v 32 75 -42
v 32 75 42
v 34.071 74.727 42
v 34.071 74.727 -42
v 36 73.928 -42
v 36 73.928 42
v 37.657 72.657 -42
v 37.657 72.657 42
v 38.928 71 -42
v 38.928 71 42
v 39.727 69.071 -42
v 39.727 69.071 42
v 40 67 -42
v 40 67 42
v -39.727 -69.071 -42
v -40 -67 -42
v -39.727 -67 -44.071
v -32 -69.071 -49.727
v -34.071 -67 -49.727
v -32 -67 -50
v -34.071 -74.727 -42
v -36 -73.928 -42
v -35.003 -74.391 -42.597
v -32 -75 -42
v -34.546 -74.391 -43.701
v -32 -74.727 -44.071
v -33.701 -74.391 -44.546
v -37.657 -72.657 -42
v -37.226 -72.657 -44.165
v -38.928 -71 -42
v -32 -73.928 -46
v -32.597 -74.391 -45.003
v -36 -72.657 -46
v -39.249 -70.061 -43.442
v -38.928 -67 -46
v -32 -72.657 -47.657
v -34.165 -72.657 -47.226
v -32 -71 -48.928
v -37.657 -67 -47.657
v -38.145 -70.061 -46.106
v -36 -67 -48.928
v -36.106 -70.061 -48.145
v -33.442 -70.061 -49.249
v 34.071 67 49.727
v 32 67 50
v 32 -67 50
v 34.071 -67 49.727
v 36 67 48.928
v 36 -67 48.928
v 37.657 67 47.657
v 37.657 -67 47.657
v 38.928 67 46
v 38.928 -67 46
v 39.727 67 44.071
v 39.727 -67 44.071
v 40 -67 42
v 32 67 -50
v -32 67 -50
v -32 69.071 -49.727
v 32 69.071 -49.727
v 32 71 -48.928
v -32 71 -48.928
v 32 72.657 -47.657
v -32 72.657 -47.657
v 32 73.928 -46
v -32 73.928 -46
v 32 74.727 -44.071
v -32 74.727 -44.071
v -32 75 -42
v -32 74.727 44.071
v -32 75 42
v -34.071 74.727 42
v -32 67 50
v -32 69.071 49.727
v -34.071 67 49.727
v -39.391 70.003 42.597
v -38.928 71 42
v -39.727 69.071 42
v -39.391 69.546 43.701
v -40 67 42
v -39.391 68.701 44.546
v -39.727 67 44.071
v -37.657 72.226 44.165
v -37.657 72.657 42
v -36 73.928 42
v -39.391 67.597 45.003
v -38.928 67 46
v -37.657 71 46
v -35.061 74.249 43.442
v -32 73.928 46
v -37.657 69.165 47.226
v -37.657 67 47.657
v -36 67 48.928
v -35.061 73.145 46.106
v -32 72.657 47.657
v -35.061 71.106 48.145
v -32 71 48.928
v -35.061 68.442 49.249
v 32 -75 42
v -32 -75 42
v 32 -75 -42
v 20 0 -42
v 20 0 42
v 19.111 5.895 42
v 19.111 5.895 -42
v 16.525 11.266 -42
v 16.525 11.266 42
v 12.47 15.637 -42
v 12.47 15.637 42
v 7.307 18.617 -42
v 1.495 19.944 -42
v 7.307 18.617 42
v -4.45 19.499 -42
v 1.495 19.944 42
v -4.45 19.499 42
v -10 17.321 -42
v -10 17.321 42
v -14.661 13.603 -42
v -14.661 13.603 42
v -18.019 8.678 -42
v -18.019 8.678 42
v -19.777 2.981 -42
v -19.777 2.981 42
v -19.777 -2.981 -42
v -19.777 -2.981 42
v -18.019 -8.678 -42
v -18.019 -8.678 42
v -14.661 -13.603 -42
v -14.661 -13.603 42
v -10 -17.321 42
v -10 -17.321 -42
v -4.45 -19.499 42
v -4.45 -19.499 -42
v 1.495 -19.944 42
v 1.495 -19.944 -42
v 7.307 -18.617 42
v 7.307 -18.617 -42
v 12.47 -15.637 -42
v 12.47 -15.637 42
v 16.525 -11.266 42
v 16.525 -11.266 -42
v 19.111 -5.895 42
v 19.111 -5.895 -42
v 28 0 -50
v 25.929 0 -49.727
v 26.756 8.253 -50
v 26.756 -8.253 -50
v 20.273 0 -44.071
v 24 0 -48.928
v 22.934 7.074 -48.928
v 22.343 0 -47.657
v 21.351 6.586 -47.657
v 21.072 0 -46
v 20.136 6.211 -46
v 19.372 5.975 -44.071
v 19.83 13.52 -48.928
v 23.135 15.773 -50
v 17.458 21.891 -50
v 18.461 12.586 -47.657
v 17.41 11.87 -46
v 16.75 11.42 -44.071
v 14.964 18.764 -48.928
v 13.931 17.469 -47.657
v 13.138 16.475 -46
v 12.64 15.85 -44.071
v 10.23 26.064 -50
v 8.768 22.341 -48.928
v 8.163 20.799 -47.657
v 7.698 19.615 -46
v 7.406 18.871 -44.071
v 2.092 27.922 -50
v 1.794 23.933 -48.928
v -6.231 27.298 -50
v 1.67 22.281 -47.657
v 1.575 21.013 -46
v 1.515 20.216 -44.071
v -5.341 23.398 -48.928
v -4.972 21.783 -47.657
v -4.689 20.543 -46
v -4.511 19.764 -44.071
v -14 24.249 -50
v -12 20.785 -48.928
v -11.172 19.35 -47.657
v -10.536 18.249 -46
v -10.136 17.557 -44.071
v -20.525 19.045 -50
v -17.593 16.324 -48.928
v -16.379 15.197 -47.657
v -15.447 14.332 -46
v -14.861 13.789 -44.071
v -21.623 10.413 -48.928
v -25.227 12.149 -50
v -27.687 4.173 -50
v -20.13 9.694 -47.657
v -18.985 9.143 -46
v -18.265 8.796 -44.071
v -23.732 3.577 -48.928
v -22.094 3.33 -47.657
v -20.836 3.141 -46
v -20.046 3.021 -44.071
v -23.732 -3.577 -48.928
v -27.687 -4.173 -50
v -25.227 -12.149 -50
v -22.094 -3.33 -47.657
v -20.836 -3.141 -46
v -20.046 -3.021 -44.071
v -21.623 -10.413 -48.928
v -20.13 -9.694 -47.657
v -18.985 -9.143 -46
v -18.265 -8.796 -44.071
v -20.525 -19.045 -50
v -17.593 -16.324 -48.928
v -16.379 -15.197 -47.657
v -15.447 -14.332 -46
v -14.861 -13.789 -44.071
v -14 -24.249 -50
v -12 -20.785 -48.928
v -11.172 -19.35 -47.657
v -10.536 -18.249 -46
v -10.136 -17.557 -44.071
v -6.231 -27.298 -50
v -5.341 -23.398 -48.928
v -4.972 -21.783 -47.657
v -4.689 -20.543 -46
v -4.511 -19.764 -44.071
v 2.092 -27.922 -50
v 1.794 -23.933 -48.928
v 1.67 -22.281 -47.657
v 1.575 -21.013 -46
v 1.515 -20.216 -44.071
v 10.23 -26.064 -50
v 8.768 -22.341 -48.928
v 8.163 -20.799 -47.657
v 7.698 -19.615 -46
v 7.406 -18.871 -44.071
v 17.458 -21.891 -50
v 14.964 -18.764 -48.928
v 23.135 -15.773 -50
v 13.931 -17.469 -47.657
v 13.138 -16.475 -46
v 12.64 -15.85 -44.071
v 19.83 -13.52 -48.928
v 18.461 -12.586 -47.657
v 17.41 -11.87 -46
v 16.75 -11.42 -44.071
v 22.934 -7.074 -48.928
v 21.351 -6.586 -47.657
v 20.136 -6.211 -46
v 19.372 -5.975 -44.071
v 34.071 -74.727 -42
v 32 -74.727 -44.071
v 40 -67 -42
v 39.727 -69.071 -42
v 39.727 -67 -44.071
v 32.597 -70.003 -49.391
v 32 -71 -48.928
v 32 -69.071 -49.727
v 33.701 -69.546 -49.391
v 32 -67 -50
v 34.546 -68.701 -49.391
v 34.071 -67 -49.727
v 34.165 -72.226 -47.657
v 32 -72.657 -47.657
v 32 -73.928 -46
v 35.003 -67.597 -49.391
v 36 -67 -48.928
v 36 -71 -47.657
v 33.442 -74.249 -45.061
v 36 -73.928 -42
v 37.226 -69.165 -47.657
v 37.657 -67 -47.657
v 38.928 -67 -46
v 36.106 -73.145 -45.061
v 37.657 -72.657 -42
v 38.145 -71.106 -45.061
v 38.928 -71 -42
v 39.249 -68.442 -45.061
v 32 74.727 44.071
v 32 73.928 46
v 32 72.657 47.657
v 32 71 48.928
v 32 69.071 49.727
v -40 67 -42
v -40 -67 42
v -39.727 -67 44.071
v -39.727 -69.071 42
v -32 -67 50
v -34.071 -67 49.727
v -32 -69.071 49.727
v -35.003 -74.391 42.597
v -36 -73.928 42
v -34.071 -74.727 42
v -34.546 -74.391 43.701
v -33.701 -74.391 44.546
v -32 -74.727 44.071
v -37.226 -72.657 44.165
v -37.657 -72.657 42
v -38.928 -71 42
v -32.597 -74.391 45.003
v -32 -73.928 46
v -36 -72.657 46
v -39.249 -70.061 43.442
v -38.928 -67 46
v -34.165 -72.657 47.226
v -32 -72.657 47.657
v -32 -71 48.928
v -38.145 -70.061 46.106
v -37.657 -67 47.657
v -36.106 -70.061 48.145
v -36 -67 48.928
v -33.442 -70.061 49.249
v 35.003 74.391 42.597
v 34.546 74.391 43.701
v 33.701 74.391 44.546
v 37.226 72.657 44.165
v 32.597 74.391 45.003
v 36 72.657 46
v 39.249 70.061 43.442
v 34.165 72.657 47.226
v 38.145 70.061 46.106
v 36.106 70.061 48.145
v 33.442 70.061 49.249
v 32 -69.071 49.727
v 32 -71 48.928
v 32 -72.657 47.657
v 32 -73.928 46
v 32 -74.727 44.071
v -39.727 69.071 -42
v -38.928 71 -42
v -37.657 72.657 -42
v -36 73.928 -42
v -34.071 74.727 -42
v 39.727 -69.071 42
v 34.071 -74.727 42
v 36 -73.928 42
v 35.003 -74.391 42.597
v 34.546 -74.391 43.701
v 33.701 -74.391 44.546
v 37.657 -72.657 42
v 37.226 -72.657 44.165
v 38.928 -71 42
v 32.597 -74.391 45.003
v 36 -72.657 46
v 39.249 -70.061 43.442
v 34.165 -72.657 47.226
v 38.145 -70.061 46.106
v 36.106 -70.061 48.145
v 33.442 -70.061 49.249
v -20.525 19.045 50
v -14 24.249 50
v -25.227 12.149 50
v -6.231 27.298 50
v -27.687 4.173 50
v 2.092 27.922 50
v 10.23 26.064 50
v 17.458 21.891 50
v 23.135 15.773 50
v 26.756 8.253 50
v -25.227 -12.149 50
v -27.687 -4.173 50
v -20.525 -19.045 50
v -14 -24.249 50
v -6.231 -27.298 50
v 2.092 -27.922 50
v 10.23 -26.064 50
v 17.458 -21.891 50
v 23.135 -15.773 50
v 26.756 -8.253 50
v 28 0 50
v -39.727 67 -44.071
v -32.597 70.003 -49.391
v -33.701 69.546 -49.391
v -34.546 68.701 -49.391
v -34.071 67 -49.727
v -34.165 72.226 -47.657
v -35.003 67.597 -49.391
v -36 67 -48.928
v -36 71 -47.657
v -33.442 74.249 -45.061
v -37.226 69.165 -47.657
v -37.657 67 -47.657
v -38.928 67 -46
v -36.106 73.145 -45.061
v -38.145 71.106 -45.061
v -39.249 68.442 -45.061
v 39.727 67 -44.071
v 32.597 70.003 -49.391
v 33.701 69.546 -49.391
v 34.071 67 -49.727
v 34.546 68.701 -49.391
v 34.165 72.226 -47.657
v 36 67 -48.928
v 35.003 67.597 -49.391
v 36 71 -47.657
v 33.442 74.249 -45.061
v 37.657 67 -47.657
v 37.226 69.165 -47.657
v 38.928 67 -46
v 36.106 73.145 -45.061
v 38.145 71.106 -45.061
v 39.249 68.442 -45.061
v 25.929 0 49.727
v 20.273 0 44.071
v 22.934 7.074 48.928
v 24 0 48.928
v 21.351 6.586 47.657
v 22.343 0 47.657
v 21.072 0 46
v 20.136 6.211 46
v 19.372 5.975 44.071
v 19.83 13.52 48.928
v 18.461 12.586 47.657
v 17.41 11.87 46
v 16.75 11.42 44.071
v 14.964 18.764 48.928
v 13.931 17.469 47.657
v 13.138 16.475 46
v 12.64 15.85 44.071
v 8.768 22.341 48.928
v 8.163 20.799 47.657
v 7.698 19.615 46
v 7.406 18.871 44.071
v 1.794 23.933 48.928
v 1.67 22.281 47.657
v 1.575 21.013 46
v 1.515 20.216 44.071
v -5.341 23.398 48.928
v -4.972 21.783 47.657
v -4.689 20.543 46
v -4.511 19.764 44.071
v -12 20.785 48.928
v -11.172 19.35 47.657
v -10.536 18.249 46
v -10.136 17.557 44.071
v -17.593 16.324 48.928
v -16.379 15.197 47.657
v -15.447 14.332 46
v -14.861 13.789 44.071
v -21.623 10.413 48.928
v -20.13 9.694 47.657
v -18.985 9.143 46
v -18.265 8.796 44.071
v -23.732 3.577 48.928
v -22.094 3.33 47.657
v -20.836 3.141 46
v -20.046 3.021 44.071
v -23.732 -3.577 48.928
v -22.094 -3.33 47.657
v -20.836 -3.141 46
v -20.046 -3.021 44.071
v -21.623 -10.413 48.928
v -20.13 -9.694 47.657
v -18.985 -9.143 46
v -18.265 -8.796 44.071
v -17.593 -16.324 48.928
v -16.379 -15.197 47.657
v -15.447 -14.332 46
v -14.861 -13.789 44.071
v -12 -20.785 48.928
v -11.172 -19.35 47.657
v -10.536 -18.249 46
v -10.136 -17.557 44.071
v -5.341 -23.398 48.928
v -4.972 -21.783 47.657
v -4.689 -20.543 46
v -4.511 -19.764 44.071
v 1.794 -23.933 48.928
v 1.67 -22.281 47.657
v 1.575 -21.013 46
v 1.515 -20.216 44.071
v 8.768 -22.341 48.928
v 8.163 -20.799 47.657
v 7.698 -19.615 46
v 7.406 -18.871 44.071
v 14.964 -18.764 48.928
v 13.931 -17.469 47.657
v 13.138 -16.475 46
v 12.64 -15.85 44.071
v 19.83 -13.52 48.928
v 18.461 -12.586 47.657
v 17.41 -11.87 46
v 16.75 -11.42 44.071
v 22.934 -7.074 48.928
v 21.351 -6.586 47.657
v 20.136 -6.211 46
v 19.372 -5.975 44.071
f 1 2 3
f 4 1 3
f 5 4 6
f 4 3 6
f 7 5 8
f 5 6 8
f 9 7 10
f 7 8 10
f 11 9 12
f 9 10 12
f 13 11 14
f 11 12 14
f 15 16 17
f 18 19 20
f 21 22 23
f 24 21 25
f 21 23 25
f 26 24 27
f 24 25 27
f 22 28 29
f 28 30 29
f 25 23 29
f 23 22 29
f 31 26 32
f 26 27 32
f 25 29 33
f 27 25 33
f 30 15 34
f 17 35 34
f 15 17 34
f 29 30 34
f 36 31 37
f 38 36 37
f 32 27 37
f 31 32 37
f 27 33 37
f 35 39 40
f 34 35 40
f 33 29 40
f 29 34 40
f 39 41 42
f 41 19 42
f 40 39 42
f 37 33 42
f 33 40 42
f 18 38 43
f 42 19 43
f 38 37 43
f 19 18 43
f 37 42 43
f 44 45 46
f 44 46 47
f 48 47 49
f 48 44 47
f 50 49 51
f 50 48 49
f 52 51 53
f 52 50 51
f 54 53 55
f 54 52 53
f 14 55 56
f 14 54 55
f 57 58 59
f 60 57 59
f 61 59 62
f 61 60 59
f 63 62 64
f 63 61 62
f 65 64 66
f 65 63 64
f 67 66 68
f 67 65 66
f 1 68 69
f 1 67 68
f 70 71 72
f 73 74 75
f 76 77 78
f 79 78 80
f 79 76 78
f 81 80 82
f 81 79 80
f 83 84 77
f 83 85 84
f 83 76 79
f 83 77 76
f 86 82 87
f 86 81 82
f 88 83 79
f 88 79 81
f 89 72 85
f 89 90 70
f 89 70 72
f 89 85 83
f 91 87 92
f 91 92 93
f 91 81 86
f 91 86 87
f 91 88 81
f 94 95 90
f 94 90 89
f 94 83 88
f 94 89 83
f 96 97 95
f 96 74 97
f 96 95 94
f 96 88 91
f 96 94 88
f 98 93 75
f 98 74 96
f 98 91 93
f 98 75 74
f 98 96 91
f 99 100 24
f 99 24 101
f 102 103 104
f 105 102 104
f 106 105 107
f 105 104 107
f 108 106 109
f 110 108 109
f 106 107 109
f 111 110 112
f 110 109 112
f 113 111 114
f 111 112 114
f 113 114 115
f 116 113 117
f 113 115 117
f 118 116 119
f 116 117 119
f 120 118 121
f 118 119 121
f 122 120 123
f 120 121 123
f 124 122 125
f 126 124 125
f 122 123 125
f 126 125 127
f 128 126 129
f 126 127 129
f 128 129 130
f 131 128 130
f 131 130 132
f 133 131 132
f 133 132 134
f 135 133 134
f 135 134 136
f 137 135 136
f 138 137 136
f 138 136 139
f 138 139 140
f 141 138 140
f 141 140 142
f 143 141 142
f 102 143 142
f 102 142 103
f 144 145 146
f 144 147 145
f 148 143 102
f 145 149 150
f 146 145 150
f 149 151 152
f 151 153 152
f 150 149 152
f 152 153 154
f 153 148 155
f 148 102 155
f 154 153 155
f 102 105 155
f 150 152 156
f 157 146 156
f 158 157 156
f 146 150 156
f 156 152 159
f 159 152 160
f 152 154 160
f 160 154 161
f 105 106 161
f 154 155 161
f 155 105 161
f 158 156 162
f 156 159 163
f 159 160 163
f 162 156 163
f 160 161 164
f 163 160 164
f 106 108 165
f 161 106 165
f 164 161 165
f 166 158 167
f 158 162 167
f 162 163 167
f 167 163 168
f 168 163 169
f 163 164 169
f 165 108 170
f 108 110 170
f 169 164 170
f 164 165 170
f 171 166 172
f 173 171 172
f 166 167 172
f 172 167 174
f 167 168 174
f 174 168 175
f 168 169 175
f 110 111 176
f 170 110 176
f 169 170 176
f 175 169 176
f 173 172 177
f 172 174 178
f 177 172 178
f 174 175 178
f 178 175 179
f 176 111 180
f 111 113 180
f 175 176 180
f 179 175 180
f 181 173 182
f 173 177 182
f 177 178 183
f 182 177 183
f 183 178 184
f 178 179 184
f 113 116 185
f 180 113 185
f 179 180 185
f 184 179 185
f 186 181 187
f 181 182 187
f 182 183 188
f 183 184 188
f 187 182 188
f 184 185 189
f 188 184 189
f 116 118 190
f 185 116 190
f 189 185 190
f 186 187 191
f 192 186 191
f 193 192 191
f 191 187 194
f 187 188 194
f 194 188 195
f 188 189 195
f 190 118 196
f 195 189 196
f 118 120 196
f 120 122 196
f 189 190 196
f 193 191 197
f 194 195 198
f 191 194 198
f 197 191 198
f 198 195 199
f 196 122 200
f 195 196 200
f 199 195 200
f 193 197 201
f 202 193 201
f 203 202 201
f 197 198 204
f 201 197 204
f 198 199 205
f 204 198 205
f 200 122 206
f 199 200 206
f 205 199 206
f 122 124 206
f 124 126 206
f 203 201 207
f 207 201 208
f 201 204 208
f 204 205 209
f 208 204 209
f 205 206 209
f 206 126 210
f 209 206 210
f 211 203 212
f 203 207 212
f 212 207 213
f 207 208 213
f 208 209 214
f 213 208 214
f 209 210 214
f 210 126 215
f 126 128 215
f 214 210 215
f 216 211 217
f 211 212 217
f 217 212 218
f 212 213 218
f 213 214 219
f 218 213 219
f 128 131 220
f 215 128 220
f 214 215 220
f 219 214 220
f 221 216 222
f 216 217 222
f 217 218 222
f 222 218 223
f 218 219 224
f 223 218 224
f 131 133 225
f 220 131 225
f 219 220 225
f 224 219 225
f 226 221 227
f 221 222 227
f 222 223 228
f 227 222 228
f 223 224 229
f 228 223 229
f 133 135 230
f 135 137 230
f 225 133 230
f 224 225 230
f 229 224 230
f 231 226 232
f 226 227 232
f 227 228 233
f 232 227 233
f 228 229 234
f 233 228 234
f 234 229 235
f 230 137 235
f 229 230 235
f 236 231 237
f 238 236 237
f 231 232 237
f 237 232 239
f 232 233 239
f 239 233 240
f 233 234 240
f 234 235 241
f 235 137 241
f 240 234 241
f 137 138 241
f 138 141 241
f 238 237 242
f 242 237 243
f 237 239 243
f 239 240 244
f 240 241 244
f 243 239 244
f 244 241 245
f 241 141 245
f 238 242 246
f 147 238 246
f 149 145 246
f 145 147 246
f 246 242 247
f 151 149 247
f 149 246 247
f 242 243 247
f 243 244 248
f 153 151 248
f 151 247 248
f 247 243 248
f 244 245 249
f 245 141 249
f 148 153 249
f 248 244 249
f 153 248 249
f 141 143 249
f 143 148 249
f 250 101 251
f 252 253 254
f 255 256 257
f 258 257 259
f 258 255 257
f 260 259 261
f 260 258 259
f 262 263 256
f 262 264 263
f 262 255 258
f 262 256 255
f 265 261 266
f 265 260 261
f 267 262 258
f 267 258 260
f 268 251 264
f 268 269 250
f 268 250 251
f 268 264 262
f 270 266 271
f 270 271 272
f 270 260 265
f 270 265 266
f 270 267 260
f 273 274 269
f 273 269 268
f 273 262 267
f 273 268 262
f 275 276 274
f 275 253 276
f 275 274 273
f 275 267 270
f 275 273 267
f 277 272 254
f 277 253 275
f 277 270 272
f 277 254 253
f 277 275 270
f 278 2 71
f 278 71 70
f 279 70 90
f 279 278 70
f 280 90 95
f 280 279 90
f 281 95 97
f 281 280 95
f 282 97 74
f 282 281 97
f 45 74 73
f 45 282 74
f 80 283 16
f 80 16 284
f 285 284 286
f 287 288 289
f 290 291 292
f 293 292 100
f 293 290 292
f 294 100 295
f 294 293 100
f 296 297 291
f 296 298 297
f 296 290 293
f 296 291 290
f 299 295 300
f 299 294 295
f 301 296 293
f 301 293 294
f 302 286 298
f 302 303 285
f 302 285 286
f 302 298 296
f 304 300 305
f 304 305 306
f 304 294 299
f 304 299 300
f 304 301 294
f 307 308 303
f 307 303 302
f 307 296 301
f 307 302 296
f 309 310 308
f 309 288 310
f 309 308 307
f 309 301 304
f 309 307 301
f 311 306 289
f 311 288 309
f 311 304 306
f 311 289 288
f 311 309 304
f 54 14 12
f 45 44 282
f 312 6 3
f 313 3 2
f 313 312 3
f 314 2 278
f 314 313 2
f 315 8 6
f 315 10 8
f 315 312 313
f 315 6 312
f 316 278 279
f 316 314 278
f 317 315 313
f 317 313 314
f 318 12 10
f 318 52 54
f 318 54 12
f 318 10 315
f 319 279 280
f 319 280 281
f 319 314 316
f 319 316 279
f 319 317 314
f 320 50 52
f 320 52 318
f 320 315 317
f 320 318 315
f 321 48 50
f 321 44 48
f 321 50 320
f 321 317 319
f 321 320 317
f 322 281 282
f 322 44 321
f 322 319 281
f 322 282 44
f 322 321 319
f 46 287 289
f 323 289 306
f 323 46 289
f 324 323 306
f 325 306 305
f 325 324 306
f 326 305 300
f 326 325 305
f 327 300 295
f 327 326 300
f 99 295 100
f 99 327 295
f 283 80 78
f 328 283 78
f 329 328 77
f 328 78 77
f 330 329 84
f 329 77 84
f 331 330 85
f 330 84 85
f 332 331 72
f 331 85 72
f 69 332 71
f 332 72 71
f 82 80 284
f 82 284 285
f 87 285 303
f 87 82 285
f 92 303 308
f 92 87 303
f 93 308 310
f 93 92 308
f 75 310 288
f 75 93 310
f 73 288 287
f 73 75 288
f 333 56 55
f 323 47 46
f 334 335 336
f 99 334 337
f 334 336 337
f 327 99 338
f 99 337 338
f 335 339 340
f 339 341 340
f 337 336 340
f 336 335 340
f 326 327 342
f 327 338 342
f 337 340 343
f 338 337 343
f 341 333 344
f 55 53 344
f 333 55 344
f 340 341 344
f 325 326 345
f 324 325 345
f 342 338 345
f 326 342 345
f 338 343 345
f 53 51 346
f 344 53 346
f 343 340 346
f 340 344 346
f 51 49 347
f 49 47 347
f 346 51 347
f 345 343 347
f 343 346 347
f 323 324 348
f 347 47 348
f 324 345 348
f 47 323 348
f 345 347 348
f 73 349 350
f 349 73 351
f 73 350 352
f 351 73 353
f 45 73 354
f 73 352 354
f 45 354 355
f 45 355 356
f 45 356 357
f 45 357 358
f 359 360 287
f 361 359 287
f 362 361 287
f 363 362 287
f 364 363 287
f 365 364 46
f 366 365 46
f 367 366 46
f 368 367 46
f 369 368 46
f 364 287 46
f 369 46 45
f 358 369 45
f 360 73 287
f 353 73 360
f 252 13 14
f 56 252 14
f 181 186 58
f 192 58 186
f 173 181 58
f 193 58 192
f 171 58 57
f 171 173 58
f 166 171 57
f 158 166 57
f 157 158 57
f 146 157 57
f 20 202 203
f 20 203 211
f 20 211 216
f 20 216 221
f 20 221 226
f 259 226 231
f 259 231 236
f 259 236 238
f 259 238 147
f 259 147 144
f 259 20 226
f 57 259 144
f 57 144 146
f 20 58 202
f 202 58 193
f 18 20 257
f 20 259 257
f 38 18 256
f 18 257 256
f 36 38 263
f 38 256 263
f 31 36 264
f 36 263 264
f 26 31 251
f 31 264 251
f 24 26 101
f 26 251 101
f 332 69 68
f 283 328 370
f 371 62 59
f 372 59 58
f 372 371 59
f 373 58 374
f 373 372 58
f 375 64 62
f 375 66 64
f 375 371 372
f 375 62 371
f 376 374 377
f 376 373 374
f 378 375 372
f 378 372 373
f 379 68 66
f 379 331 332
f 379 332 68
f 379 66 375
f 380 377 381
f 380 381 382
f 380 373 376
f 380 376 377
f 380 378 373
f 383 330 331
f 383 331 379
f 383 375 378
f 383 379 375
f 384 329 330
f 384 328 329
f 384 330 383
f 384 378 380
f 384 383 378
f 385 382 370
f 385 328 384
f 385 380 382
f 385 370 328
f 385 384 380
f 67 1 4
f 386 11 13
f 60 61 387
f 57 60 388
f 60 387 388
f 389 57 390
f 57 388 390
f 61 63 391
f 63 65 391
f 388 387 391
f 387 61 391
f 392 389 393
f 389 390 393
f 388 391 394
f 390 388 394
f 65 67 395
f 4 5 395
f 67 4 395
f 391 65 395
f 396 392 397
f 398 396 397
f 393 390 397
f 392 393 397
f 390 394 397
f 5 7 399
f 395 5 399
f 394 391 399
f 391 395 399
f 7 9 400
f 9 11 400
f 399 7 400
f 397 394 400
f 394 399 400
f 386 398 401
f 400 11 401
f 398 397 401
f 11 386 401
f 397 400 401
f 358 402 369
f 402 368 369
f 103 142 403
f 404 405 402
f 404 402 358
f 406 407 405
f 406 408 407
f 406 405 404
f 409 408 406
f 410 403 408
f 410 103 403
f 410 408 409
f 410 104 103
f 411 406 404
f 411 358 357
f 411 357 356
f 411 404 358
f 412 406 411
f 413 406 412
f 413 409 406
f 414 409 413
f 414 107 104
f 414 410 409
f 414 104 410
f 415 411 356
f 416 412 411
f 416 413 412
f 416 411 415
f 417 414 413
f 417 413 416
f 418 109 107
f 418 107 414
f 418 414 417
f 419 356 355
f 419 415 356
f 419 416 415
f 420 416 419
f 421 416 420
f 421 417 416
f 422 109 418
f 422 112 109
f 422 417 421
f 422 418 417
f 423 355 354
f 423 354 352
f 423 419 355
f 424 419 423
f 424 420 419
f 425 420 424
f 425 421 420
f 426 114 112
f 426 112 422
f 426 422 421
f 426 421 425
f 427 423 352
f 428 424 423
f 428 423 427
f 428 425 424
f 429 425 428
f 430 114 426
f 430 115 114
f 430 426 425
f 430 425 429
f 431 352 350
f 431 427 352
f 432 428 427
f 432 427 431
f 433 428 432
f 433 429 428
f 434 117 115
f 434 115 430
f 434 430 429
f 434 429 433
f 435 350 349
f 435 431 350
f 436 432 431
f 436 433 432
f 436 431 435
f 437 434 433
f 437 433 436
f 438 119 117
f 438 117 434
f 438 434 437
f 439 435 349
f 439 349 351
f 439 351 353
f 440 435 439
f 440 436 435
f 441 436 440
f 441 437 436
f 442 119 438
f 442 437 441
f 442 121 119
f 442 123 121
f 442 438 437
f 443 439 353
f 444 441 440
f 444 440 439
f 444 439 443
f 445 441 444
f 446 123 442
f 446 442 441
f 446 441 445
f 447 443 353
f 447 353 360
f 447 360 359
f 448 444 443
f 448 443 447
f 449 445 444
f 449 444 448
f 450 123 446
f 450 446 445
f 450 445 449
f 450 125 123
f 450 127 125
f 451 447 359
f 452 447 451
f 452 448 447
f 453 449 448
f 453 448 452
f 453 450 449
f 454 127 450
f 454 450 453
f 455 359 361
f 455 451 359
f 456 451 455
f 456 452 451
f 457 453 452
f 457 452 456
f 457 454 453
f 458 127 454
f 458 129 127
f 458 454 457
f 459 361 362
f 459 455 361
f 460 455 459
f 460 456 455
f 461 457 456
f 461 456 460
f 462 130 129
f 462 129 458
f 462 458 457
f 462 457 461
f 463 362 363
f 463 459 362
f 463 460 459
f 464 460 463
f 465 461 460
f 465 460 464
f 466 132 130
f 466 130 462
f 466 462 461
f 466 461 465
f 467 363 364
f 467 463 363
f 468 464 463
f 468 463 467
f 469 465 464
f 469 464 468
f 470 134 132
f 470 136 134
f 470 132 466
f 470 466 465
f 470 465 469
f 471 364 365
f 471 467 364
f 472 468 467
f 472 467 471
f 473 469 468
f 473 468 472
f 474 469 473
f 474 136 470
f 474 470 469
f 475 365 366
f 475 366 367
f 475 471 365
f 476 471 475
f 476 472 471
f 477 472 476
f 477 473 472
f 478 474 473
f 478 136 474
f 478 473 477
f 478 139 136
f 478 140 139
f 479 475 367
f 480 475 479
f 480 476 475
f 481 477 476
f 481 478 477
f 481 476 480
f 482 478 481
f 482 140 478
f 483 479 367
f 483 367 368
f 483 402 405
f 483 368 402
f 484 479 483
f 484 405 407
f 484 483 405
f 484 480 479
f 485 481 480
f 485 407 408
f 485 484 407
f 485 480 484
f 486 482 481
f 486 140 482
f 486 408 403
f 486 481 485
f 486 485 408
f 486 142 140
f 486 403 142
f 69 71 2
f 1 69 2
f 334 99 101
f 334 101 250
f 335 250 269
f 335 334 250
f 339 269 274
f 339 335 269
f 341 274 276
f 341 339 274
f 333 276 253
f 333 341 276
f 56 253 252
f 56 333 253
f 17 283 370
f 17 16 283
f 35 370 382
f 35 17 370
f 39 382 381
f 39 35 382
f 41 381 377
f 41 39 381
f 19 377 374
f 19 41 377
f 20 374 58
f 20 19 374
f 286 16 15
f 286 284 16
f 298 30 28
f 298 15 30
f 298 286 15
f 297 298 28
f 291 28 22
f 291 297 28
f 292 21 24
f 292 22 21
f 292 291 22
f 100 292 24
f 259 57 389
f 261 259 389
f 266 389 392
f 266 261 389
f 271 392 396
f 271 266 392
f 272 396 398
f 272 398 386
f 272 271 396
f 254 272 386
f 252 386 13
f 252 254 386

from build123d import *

# Parameters (mm, degrees)
F0_W     = 80
F0_H     = 100
F1_DEPTH = 75
F2_R     = 20
F3_DEPTH = 107
F4_R     = 8


with BuildPart() as f1:
    # F0 (on Front) → F1 (new body, symmetric)
    with BuildSketch(Plane.XZ):
        Rectangle(F0_W, F0_H)
    extrude(amount=F1_DEPTH, both=True)

    # F2 (on face) → F3 (cut)
    with BuildSketch(Plane.XY.offset(50)):
        Circle(F2_R)
    extrude(amount=-F3_DEPTH, mode=Mode.SUBTRACT)

    # F4
    f4_edges = [f1.edges().sort_by_distance(p)[0] for p in [
        (40, 0, 50),
        (40, 75, 0),
        (0, 75, 50),
        (-40, 75, 0),
        (0, 75, -50),
        (-40, 0, 50),
        (-40, 0, -50),
        (-40, -75, 0),
        (40, -75, 0),
        (0, -75, 50),
        (0, -75, -50),
        (40, 0, -50),
        (-20, 0, -50),
        (-20, 0, 50),
    ]]
    fillet(f4_edges, radius=F4_R)


solid = f1.part
